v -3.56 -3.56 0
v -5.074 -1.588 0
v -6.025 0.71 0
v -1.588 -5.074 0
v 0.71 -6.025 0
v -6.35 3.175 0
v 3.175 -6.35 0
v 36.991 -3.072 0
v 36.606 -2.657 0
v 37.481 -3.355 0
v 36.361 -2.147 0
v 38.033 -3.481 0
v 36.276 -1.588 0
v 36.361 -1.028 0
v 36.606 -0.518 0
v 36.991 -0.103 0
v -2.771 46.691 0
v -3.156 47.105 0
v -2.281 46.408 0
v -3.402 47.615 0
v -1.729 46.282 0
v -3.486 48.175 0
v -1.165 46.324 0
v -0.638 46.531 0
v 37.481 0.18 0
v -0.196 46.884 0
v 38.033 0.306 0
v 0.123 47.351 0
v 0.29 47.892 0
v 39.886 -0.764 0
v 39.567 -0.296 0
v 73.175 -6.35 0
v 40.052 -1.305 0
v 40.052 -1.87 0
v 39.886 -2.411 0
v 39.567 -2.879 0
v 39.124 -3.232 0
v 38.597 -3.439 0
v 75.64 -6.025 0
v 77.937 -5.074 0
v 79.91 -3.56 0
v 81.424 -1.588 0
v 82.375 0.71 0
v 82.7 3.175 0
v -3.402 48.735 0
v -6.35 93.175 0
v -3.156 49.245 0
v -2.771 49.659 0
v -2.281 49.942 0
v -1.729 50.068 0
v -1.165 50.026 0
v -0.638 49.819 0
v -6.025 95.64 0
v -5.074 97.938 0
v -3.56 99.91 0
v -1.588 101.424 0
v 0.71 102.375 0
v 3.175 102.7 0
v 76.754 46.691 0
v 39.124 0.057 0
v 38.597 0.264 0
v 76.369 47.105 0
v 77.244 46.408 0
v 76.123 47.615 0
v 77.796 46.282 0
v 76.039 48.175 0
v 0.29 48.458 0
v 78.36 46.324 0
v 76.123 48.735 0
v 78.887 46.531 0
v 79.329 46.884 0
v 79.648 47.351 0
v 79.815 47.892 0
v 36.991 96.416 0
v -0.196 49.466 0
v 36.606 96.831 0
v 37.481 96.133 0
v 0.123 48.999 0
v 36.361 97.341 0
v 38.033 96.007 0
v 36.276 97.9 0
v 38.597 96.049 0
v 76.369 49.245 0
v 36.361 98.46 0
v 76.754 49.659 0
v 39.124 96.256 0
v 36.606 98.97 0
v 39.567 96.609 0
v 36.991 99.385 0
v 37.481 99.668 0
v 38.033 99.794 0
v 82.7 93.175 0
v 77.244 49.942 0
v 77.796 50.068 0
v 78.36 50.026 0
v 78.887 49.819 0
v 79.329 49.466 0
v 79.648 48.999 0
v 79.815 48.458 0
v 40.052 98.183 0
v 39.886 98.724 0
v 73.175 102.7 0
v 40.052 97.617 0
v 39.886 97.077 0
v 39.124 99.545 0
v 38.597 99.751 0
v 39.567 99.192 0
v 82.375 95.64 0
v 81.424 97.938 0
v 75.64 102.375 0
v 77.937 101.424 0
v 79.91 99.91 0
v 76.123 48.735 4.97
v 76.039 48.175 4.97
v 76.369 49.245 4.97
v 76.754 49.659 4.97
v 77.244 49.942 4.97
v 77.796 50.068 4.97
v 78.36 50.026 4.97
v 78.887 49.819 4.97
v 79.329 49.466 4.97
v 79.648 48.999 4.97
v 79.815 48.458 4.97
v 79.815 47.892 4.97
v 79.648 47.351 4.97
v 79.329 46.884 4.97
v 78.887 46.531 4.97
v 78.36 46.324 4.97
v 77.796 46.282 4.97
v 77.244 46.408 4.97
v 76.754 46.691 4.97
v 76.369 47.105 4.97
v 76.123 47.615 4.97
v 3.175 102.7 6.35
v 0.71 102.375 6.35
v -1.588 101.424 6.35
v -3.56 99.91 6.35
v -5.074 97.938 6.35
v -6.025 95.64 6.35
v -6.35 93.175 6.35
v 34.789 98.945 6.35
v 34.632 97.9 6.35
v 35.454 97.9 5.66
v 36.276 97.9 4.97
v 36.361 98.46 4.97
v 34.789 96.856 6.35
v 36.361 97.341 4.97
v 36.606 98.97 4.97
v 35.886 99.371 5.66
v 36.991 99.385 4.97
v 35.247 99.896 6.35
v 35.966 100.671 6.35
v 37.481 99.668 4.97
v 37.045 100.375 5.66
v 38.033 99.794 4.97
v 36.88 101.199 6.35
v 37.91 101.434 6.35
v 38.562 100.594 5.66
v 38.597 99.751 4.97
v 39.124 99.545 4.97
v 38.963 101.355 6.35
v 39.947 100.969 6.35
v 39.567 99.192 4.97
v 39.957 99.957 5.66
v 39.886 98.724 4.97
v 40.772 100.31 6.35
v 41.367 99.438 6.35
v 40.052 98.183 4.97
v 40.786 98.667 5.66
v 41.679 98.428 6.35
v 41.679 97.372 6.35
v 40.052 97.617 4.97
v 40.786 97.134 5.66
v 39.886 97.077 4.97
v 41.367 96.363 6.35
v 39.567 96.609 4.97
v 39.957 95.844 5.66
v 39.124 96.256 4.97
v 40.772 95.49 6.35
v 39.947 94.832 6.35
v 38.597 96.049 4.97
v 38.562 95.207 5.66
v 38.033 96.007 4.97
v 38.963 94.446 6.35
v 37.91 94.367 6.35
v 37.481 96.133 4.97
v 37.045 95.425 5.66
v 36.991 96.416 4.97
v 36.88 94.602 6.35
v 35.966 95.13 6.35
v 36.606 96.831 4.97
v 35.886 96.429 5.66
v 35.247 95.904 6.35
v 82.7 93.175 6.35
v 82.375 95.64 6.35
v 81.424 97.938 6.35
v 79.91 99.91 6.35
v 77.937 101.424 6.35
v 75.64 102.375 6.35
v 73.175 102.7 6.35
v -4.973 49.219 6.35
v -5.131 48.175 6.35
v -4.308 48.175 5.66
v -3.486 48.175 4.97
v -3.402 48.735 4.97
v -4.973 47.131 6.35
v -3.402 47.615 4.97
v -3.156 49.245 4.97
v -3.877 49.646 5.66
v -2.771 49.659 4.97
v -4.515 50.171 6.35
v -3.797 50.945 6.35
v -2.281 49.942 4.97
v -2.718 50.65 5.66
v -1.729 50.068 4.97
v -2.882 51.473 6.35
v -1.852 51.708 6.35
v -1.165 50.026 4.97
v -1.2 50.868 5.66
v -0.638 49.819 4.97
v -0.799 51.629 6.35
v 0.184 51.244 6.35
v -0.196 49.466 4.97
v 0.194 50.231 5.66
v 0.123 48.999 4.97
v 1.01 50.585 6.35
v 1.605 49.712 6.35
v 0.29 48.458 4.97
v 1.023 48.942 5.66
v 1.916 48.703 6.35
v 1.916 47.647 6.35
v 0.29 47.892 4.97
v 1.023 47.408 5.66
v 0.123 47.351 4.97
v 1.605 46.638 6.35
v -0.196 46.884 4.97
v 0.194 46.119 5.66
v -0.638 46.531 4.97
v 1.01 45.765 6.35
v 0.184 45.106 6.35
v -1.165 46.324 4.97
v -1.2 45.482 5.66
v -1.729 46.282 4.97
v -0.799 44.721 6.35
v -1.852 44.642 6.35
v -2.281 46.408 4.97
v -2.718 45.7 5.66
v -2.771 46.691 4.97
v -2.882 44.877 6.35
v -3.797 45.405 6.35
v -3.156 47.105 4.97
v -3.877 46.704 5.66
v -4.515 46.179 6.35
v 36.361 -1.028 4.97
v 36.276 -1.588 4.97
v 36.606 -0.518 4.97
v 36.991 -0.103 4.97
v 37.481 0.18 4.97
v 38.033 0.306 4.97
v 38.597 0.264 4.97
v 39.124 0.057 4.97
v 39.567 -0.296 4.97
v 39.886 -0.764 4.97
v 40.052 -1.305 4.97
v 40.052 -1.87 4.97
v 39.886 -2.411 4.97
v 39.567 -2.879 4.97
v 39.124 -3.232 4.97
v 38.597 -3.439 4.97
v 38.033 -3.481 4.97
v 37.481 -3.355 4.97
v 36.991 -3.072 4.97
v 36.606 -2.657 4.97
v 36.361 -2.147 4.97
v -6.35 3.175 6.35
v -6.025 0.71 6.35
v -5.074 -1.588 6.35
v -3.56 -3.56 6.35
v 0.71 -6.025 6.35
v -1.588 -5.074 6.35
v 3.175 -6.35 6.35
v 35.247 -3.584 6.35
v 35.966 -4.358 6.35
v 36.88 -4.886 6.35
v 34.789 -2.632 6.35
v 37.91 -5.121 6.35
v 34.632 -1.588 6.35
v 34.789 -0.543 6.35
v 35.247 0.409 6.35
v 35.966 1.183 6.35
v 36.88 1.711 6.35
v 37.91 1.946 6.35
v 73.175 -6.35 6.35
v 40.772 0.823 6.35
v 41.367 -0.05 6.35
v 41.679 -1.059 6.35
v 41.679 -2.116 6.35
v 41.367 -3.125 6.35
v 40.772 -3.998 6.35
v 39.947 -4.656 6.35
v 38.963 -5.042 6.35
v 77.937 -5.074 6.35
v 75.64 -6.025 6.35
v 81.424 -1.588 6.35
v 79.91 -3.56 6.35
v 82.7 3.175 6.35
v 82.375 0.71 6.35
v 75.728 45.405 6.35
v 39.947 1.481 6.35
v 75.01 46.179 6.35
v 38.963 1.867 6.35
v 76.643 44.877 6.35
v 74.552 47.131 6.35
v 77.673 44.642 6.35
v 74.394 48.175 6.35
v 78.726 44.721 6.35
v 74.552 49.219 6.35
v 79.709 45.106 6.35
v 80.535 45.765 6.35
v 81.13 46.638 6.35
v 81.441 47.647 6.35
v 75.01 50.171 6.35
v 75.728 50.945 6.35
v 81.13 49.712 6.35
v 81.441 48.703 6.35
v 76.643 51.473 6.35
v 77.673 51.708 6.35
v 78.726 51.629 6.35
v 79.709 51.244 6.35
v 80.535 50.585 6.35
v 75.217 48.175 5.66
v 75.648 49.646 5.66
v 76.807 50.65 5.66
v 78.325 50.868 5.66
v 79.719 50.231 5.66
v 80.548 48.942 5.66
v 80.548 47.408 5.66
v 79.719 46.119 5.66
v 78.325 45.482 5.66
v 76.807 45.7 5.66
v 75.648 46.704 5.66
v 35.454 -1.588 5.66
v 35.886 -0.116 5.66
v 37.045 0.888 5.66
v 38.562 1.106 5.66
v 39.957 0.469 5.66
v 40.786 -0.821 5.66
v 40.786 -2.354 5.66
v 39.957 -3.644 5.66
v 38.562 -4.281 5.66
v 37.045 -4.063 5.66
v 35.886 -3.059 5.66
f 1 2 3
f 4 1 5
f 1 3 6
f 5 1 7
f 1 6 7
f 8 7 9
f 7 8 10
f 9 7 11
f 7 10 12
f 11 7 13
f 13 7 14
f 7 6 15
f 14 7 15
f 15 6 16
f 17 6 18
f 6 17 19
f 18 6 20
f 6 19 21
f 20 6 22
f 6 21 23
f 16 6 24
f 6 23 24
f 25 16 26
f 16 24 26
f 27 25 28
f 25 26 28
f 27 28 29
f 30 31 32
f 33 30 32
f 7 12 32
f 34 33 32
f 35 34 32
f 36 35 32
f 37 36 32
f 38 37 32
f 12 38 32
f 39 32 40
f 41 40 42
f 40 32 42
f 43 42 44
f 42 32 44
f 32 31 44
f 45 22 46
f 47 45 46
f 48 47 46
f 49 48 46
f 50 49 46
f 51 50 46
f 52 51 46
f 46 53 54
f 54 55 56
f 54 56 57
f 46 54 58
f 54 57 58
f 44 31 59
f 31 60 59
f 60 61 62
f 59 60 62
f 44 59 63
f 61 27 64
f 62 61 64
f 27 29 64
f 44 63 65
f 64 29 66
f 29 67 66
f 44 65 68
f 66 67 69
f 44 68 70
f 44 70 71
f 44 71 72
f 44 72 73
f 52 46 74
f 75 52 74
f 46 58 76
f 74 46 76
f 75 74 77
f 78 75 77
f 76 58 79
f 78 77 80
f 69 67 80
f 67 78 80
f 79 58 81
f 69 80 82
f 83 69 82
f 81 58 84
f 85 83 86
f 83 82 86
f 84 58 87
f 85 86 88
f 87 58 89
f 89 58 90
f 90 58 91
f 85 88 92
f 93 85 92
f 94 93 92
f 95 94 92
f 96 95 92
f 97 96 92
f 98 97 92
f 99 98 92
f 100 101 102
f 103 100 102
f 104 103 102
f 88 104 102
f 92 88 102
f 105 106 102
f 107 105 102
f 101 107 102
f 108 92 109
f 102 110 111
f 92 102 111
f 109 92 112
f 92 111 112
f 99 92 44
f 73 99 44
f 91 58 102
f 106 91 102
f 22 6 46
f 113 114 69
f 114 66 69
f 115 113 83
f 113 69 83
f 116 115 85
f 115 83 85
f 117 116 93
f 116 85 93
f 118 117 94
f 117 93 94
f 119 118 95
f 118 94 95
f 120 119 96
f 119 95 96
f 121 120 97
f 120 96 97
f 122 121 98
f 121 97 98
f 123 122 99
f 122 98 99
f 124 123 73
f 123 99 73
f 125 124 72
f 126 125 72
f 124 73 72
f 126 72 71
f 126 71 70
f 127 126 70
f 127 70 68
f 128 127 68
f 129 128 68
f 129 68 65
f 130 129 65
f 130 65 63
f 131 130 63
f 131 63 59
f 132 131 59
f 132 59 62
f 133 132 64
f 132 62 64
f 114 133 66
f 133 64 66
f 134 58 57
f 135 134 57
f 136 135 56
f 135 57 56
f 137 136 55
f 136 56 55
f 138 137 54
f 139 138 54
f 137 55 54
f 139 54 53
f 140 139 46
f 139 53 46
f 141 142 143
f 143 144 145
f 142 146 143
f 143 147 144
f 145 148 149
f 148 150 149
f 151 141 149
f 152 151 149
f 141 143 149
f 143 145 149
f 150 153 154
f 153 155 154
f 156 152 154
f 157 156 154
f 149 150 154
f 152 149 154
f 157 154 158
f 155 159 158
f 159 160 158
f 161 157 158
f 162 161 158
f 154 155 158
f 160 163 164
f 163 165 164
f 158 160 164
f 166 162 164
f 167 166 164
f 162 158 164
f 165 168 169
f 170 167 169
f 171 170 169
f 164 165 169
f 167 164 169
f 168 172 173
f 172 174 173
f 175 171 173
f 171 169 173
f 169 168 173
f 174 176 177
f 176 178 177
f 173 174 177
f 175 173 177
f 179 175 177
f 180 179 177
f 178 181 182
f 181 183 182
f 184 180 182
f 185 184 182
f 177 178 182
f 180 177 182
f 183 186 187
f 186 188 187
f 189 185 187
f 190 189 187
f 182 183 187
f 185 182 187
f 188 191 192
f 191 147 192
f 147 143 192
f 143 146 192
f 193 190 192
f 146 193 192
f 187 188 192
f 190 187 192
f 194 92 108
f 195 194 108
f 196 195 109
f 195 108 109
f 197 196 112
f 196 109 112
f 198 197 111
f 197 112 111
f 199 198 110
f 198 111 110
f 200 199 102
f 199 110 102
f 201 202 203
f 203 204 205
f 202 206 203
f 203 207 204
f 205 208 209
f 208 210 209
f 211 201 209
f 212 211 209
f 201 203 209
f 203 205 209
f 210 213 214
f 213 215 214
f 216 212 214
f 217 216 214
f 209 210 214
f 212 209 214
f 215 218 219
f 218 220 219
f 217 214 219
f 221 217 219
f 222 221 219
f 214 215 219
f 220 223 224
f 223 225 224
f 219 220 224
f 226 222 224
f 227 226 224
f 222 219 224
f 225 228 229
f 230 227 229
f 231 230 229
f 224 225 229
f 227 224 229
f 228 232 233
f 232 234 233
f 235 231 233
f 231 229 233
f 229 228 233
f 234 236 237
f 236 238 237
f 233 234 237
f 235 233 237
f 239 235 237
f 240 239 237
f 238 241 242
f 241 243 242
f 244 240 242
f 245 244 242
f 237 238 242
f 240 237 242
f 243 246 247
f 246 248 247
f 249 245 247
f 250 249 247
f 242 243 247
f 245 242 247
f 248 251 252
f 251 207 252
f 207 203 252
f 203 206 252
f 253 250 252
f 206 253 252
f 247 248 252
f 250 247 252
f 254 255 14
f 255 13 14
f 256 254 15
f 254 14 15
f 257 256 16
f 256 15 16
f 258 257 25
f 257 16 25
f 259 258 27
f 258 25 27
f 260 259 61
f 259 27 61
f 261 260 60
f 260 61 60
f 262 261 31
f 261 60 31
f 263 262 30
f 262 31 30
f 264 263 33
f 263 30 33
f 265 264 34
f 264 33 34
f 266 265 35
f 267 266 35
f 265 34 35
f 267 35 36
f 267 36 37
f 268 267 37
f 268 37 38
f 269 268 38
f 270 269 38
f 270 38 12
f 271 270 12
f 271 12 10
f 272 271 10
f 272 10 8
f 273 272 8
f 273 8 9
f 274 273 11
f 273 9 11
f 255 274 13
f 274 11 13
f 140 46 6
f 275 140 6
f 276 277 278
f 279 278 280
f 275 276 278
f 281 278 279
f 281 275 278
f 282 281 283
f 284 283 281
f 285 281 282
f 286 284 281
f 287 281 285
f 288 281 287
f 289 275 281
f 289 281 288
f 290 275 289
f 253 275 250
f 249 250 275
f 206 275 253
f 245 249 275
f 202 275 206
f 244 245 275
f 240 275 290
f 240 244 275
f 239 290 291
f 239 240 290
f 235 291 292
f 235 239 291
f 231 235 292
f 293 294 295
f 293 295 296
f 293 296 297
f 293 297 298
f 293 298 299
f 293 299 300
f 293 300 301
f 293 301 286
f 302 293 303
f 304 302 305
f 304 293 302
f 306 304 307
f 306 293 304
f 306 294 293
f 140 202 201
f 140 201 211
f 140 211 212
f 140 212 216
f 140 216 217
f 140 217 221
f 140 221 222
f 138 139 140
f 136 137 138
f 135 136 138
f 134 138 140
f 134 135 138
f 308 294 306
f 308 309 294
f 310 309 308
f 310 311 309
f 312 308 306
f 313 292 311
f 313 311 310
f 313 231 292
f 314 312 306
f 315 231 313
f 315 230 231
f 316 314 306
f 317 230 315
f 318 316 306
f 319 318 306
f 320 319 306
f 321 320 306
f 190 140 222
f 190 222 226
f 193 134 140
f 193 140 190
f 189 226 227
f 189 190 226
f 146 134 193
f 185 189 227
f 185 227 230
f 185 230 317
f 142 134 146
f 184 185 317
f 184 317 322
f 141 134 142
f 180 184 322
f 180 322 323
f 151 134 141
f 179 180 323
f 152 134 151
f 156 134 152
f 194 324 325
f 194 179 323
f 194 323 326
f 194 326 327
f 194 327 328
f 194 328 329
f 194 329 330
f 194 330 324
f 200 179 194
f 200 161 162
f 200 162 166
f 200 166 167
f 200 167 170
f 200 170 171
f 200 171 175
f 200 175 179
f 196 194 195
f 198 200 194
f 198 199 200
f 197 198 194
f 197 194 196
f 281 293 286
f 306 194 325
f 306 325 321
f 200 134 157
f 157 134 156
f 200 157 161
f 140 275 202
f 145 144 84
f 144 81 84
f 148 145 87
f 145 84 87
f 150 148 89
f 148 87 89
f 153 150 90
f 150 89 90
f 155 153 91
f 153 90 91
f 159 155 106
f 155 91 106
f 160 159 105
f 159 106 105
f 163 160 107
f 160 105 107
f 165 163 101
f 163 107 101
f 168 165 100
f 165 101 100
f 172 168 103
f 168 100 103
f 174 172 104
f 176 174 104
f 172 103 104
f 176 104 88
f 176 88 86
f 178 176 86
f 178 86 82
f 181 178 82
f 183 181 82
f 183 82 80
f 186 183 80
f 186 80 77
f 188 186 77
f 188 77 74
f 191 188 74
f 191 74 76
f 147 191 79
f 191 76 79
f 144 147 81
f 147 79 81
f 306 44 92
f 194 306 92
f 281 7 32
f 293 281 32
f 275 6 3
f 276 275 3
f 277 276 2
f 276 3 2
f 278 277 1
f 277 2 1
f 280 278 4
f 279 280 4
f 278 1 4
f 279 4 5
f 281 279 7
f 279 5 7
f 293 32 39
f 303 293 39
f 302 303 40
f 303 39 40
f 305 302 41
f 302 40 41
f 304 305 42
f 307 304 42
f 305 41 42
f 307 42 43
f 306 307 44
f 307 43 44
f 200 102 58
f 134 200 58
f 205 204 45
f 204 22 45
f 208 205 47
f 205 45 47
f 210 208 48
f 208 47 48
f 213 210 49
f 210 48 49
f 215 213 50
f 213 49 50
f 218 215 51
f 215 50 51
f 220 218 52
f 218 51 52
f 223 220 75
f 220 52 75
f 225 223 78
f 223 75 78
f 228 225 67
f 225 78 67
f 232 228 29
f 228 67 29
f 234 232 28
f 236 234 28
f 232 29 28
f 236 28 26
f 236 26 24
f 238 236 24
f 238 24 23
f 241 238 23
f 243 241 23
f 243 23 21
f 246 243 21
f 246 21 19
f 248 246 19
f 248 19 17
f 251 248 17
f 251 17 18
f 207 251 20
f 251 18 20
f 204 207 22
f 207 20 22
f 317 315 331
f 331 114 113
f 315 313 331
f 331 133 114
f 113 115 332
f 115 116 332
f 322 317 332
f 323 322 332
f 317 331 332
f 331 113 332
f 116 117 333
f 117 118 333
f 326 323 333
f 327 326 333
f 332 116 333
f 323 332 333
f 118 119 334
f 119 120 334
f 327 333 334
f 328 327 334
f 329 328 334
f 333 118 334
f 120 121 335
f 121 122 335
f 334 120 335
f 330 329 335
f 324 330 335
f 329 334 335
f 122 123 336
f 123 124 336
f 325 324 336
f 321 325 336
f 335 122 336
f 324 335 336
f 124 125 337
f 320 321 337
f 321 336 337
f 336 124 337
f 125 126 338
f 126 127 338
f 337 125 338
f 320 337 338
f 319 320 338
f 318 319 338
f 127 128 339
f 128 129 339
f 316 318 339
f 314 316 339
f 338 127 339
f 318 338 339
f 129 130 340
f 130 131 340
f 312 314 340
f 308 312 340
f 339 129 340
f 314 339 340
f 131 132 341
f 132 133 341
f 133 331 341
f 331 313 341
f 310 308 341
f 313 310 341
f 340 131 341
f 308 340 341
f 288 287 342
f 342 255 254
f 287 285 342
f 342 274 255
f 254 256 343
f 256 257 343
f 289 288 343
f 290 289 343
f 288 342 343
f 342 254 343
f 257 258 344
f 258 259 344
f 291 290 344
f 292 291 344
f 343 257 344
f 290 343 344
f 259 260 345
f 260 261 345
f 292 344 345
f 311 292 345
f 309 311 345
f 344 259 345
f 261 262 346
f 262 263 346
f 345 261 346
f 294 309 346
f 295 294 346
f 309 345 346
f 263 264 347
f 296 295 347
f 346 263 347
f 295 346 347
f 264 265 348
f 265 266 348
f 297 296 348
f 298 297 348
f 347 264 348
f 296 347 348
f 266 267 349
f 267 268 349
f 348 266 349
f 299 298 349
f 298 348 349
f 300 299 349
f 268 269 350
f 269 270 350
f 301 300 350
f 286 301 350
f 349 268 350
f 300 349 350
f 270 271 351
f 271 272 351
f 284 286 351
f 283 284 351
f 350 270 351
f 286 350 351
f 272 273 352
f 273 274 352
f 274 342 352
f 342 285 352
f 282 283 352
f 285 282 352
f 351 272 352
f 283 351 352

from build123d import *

# Parameters (mm, degrees)
SKETCH1_R                                         = 1.5875
BOSS_EXTRUDE1_DEPTH                               = 6.35
CSK_FOR_6_FLAT_HEAD_MACHINE_SCREW_100_D           = 3.7973
CSK_FOR_6_FLAT_HEAD_MACHINE_SCREW_100_CSINK_D     = 7.0866
CSK_FOR_6_FLAT_HEAD_MACHINE_SCREW_100_CSINK_ANGLE = 100


with BuildPart() as part:
    # Sketch1 → Boss-Extrude1 (new body)
    with BuildSketch(Plane.XY):
        with BuildLine():
            Line((3.175, -6.35), (73.174999954, -6.35))
            ThreePointArc((73.174999954, -6.35), (79.910192045, -3.560192091), (82.699999954, 3.175))
            Line((82.699999954, 3.175), (82.699999954, 93.175000086))
            ThreePointArc((82.699999954, 93.175000086), (79.910192045, 99.910192177), (73.174999954, 102.700000086))
            Line((73.174999954, 102.700000086), (3.175, 102.700000086))
            ThreePointArc((3.175, 102.700000086), (-3.560192091, 99.910192177), (-6.35, 93.175000086))
            Line((-6.35, 93.175000086), (-6.35, 3.175))
            ThreePointArc((-6.35, 3.175), (-3.560192091, -3.560192091), (3.175, -6.35))
        make_face()
        with Locations((38.174999977, -1.5875)):
            Circle(SKETCH1_R, mode=Mode.SUBTRACT)
        with Locations((77.937499954, 48.175000043)):
            Circle(SKETCH1_R, mode=Mode.SUBTRACT)
        with Locations((38.174999977, 97.937500086)):
            Circle(SKETCH1_R, mode=Mode.SUBTRACT)
        with Locations((-1.5875, 48.175000043)):
            Circle(SKETCH1_R, mode=Mode.SUBTRACT)
    extrude(amount=BOSS_EXTRUDE1_DEPTH)

    # CSK for #6 Flat Head Machine Screw (100)1 (through all)
    with Locations(Plane.XY.offset(6.35)):
        with Locations((-1.5875, 48.175000043), (77.937499954, 48.175000043), (38.174999977, -1.5875), (38.174999977, 97.900367712)):
            CounterSinkHole(CSK_FOR_6_FLAT_HEAD_MACHINE_SCREW_100_D / 2, CSK_FOR_6_FLAT_HEAD_MACHINE_SCREW_100_CSINK_D / 2, counter_sink_angle=CSK_FOR_6_FLAT_HEAD_MACHINE_SCREW_100_CSINK_ANGLE)


solid = part.part
